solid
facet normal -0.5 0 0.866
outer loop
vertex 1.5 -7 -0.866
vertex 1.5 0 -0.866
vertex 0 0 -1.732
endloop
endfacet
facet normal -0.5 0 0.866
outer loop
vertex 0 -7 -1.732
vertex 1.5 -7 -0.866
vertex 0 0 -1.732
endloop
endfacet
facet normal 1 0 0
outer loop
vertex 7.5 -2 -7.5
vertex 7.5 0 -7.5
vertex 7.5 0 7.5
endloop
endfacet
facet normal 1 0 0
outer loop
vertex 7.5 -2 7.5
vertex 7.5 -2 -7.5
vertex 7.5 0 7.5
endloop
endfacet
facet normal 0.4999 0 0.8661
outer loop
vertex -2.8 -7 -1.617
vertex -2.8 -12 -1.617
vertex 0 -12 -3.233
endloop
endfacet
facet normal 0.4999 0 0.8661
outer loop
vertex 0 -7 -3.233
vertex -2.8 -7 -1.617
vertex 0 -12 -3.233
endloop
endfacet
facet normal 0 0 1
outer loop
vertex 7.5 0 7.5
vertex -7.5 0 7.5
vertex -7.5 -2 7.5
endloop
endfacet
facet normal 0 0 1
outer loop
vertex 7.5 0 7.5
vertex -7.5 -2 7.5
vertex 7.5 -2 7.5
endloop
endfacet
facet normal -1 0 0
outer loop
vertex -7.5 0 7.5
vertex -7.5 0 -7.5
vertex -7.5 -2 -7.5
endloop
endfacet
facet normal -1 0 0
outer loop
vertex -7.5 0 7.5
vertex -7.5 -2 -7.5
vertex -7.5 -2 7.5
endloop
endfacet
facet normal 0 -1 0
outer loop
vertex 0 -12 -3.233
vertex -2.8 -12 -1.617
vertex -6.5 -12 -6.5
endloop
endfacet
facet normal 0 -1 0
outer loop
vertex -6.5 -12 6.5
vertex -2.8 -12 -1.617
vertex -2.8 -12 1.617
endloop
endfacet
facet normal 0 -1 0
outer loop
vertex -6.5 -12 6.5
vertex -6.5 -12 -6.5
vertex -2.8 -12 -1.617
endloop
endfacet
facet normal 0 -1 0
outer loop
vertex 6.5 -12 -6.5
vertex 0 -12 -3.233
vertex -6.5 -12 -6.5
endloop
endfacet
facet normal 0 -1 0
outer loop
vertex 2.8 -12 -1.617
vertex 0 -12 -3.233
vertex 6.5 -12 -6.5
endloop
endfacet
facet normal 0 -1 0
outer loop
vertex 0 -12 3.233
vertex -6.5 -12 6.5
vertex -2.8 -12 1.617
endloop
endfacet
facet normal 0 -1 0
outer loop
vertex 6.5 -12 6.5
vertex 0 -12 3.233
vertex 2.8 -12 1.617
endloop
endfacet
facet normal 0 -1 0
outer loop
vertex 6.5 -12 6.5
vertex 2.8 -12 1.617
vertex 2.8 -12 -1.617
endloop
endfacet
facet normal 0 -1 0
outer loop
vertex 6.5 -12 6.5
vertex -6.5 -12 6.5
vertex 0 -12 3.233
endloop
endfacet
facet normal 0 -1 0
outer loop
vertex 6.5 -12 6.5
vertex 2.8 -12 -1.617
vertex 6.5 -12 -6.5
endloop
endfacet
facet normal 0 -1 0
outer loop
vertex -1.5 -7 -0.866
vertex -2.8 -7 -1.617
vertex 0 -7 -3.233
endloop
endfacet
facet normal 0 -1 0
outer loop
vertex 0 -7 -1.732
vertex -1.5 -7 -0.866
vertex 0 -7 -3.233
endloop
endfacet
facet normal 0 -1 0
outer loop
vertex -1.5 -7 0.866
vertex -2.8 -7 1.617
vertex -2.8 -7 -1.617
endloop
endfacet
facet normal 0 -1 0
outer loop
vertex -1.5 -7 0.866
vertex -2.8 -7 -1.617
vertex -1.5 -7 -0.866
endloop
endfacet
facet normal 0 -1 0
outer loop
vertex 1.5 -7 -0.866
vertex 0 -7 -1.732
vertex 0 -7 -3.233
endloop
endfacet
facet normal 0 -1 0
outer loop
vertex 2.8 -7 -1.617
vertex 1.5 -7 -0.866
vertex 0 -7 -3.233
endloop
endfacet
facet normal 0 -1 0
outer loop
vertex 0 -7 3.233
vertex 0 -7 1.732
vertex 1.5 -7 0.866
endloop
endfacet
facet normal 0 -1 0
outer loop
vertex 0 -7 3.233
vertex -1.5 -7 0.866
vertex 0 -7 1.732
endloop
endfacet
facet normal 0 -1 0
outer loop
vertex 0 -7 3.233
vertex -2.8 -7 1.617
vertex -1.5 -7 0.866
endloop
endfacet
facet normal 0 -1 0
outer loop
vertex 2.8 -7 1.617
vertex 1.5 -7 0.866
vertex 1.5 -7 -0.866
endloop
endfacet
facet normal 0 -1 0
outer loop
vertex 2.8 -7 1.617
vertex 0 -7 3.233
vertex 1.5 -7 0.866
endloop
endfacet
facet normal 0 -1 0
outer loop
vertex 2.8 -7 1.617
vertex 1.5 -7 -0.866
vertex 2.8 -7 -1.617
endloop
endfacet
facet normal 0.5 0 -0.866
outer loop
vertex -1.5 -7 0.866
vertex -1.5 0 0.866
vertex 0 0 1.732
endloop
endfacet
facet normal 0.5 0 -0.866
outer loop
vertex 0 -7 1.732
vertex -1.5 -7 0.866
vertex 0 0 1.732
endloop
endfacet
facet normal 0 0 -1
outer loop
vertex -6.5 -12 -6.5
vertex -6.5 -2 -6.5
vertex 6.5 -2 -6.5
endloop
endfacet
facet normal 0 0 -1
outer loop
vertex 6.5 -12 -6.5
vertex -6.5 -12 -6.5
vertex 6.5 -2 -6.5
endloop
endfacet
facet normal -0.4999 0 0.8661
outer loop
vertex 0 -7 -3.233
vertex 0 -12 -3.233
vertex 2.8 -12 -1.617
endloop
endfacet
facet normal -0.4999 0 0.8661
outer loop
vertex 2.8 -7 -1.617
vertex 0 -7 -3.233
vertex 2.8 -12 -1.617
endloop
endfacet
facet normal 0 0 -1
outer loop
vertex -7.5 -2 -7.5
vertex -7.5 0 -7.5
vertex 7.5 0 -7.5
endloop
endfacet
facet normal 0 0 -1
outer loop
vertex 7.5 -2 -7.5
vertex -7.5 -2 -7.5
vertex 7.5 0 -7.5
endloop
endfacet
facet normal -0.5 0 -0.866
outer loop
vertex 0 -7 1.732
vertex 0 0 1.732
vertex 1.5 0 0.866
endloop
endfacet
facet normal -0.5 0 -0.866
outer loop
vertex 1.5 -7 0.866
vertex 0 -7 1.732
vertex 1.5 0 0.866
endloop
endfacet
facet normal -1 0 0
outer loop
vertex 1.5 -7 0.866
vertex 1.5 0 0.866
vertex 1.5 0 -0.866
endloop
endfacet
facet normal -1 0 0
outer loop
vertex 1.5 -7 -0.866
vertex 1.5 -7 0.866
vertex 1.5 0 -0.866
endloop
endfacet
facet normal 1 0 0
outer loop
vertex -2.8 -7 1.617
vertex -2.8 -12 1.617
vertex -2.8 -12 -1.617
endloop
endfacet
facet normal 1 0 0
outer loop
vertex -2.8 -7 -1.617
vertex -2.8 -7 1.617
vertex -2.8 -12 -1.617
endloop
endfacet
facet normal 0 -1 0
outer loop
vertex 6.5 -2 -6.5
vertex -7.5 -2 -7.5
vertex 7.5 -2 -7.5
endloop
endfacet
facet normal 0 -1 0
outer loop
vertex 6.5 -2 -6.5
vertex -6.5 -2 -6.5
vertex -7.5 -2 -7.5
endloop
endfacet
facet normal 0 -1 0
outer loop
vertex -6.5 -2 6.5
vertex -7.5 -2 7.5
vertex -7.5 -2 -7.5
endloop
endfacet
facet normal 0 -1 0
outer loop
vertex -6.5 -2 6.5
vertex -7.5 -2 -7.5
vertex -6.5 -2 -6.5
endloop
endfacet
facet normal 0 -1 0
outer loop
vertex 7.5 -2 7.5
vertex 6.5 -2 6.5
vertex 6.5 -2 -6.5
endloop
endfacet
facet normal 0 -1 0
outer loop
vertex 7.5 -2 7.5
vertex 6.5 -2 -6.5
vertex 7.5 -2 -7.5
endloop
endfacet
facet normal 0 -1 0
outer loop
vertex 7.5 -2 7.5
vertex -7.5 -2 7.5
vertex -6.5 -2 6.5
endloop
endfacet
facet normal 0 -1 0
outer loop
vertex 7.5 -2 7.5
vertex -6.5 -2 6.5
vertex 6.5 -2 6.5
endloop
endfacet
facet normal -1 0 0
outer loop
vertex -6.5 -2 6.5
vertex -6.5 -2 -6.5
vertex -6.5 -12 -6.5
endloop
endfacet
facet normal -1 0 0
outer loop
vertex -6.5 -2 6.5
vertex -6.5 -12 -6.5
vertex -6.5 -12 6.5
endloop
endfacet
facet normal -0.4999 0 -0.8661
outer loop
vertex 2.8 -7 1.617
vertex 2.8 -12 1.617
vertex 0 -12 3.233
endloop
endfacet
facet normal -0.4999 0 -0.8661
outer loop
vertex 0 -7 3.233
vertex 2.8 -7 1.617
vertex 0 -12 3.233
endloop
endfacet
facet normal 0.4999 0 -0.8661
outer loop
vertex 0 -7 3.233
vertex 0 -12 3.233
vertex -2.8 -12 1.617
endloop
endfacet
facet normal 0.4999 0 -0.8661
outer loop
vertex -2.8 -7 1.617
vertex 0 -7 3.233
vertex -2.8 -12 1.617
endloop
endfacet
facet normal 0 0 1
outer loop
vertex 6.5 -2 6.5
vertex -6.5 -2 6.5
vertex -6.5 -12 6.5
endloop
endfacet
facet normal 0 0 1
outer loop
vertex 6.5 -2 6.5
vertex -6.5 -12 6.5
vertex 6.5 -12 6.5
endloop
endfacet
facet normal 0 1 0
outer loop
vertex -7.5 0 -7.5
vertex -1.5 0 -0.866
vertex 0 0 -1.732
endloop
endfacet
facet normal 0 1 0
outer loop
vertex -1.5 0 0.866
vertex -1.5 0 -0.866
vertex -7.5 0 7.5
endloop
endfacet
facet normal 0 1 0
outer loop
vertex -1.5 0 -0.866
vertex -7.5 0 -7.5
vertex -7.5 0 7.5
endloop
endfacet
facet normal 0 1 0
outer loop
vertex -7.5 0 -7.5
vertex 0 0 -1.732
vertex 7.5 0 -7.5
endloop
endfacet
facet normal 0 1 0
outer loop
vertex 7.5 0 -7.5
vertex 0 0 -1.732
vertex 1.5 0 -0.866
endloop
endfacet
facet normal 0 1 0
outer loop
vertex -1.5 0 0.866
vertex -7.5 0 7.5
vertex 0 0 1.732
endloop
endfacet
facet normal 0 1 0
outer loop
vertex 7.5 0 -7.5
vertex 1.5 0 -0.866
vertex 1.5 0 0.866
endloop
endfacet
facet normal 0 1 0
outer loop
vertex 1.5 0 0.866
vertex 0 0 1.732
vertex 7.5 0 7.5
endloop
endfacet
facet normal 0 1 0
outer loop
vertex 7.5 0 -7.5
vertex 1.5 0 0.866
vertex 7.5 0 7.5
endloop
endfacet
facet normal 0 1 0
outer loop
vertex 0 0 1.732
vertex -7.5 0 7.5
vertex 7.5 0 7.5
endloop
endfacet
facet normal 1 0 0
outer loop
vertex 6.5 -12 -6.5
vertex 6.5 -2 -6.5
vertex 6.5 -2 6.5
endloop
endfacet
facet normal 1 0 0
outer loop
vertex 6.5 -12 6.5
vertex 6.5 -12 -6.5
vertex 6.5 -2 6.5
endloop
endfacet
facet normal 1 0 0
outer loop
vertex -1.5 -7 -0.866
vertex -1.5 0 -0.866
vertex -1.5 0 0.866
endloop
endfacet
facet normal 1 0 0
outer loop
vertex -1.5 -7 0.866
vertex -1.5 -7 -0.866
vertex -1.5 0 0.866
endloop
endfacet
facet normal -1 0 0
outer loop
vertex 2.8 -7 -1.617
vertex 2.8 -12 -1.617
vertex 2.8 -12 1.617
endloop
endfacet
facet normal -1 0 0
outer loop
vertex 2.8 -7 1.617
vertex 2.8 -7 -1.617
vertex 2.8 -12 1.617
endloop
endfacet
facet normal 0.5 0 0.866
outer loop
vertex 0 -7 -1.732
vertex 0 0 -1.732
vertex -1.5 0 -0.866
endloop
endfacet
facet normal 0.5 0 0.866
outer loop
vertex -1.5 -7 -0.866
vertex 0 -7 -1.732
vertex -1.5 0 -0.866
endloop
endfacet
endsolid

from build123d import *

# Parameters (mm, degrees)
F0_W     = 15
F0_H     = 15
F1_DEPTH = 2
F2_W     = 13
F2_H     = 13
F3_DEPTH = 10
F5_DEPTH = 12
F7_DEPTH = 5


# Not quite as in the source:
# - a feature names something its author has since deleted; it is built from what else it names


with BuildPart() as f1:
    # F0 (on Front) → F1 (new body)
    with BuildSketch(Plane.XZ):
        Rectangle(F0_W, F0_H)
    extrude(amount=F1_DEPTH)

    # F2 (on face) → F3 (join)
    with BuildSketch(Plane.XZ.offset(2)):
        Rectangle(F2_W, F2_H)
    extrude(amount=F3_DEPTH)

    # F4 (on face) → F5 (cut, through all)
    with BuildSketch(Plane(origin=(0, 0, 0), x_dir=(-1, 0, 0), z_dir=(0, 1, 0))):
        Polygon((1.5, -0.8660254038), (1.5, 0.8660254038), (0, 1.7320508076), (-1.5, 0.8660254038), (-1.5, -0.8660254038), (0, -1.7320508076), align=None)
    extrude(amount=-F5_DEPTH, mode=Mode.SUBTRACT)

    # F6 (on face) → F7 (cut)
    with BuildSketch(Plane.XZ.offset(12)):
        Polygon((-2.8, 1.6165807537), (-2.8, -1.6165807537), (0, -3.2331615075), (2.8, -1.6165807537), (2.8, 1.6165807537), (0, 3.2331615075), align=None)
        Polygon((1.5, 0.8660254038), (1.5, -0.8660254038), (0, -1.7320508076), (-1.5, -0.8660254038), (-1.5, 0.8660254038), (0, 1.7320508076), align=None, mode=Mode.SUBTRACT)
    extrude(amount=-F7_DEPTH, mode=Mode.SUBTRACT)


solid = f1.part
